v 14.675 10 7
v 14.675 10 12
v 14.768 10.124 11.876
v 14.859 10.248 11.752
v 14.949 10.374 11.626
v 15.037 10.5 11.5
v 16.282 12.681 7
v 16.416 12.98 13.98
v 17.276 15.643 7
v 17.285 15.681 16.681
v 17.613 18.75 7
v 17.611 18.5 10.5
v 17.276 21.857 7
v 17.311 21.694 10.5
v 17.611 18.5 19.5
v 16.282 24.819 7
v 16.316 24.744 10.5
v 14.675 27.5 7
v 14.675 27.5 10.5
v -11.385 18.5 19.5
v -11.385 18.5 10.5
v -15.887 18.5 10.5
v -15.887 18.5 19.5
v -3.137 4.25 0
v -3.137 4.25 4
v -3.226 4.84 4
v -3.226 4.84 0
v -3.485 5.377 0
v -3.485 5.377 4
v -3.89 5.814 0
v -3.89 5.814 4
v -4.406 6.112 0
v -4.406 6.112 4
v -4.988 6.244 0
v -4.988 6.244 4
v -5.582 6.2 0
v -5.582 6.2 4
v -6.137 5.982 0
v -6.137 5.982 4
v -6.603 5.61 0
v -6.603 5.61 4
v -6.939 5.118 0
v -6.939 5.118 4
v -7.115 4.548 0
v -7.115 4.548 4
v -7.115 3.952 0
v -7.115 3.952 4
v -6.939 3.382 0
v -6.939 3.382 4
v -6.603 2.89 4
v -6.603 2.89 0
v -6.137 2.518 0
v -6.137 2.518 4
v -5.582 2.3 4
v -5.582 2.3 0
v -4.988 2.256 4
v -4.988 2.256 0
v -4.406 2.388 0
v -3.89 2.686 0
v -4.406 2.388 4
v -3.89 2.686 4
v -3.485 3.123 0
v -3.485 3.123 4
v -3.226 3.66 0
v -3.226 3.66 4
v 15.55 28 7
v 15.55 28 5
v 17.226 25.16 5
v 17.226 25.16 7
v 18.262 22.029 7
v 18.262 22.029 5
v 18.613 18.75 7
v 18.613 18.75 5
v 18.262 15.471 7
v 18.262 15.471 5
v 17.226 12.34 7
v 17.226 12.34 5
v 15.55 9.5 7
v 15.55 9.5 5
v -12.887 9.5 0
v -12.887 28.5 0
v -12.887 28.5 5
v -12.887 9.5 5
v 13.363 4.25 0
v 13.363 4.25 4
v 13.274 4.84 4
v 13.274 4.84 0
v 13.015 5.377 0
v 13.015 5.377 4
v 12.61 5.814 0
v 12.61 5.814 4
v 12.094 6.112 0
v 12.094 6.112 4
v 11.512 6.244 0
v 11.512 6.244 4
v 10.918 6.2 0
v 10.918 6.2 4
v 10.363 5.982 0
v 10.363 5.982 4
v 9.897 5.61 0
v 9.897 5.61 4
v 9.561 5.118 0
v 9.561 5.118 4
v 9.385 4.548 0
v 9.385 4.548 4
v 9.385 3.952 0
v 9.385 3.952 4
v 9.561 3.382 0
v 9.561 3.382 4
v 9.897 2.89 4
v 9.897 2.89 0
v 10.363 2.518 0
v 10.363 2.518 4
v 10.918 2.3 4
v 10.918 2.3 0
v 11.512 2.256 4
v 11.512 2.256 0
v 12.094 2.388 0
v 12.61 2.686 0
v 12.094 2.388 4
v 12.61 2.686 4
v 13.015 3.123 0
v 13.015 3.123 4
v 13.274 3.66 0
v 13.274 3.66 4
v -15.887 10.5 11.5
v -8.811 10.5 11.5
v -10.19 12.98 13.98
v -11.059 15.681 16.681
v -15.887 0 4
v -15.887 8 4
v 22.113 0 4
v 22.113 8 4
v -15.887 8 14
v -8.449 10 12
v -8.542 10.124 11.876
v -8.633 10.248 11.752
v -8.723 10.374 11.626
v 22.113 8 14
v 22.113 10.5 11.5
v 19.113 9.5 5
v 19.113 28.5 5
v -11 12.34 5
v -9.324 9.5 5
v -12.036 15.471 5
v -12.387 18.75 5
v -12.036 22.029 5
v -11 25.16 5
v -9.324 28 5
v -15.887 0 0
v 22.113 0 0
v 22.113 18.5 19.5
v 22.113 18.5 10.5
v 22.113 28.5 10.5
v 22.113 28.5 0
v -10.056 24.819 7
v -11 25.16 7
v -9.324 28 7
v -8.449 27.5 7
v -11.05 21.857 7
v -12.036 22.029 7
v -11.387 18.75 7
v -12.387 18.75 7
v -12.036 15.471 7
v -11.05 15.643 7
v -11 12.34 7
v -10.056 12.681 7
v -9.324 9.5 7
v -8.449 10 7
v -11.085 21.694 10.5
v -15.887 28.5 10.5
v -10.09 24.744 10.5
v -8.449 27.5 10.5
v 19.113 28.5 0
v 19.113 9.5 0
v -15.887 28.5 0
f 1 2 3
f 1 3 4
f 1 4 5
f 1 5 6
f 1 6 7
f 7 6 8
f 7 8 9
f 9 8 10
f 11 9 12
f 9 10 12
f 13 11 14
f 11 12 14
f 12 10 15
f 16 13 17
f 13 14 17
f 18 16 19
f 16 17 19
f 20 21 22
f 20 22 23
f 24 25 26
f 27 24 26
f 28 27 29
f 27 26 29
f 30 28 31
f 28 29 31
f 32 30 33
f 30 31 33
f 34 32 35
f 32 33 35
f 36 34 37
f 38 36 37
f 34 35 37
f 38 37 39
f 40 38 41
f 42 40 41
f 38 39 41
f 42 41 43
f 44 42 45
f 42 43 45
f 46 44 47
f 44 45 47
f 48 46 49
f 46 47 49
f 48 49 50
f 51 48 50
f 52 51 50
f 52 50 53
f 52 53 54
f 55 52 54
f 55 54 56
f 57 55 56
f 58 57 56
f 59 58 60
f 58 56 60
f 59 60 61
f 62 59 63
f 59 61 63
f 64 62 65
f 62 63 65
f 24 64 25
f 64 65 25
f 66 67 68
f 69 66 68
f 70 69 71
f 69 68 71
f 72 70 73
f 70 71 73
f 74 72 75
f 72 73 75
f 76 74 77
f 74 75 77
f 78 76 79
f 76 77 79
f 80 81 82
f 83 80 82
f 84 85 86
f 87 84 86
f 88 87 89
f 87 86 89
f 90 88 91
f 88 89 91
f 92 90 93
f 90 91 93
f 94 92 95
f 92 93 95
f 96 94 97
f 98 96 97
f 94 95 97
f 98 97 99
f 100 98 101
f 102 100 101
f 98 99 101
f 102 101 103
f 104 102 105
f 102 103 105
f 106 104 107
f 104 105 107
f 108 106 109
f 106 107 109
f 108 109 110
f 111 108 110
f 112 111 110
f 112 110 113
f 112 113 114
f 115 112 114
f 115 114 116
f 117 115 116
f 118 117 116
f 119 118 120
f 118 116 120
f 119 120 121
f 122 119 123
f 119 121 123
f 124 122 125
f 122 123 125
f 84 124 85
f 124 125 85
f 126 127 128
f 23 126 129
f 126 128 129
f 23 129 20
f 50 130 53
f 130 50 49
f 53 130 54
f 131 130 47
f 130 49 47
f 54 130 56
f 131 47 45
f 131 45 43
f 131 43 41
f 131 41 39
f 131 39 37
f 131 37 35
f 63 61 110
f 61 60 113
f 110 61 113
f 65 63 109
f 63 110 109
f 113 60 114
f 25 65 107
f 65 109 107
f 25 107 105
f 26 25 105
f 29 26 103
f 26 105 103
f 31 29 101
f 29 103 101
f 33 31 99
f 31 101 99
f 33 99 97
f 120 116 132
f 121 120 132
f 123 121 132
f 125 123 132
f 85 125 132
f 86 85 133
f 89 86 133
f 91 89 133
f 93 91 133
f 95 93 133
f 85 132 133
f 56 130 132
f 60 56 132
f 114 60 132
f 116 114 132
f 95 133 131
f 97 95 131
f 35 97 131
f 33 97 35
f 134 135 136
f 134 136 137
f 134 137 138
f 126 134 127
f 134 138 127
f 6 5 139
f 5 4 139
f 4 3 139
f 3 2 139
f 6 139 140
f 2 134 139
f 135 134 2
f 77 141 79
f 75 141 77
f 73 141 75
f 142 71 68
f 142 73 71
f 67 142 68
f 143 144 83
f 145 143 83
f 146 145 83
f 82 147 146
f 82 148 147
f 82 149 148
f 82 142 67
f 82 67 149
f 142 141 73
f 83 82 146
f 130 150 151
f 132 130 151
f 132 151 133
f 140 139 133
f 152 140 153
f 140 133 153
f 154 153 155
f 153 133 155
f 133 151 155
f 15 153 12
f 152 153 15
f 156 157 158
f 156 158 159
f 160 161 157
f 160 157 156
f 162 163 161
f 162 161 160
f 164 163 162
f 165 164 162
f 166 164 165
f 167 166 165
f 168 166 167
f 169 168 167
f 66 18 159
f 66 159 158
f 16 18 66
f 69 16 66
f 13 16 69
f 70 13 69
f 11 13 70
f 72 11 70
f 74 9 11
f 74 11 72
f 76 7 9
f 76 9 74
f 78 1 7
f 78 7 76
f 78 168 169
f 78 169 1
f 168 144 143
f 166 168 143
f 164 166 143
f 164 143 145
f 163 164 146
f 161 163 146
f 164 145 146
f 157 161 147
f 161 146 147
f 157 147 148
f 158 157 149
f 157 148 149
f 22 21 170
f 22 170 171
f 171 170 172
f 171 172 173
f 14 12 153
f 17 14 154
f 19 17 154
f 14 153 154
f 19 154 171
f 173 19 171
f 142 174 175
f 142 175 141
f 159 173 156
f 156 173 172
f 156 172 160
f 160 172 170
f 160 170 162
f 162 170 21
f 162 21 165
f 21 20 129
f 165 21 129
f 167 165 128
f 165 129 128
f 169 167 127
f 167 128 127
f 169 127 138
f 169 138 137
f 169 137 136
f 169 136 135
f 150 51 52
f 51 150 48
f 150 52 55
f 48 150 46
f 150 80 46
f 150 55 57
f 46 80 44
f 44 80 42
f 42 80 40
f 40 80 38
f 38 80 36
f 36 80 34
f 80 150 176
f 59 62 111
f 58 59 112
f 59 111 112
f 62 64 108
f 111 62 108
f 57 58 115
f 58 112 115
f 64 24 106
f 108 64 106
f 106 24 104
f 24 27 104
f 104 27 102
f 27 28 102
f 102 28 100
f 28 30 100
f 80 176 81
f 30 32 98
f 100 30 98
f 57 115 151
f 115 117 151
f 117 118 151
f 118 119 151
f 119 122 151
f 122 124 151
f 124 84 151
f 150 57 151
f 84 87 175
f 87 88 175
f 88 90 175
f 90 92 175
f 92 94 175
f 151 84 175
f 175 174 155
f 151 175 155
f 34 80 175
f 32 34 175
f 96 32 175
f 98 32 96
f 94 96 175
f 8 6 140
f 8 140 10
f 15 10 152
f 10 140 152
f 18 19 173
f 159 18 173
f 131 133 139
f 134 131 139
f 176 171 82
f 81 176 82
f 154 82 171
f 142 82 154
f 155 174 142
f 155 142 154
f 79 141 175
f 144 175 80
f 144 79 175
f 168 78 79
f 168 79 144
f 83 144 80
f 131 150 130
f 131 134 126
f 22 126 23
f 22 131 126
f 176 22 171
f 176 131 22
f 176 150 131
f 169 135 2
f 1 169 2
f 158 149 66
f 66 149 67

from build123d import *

# Parameters (mm, degrees)
F0_W      = 38
F0_H      = 28.5
F1_DEPTH  = 19.5
F2_W      = 8
F2_H      = 15.5
F4_DEPTH  = 38
F6_DEPTH  = 19.5
F3_W      = 10
F3_H      = 9
F7_DEPTH  = 38
F9_DEPTH  = 38
F11_DEPTH = 7
F12_W     = 32
F12_H     = 5
F13_DEPTH = 19
F14_R     = 2
F15_DEPTH = 4


with BuildPart() as f1:
    # F0 (on Top) → F1 (new body)
    with BuildSketch(Plane.XY):
        with Locations((3.113019, 14.25)):
            Rectangle(F0_W, F0_H)
    extrude(amount=F1_DEPTH)

    # F2 (on face) → F4 (cut)
    with BuildSketch(Plane.YZ.offset(22.113019)):
        with Locations((4, 11.75)):
            Rectangle(F2_W, F2_H)
    extrude(amount=-F4_DEPTH, mode=Mode.SUBTRACT)

    # F5 (on face) → F6 (cut)
    with BuildSketch(Plane.XY.offset(19.5)):
        with BuildLine():
            ThreePointArc((-8.449312, 27.5), (-11.386981, 18.75), (-8.449312, 10))
            Line((-8.449312, 10), (14.67535, 10))
            ThreePointArc((14.67535, 10), (17.613019, 18.75), (14.67535, 27.5))
            Line((14.67535, 27.5), (-8.449312, 27.5))
        make_face()
    extrude(amount=-F6_DEPTH, mode=Mode.SUBTRACT)

    # F3 (on face) → F7 (cut)
    with BuildSketch(Plane.YZ.offset(22.113019)):
        with Locations((23.5, 15)):
            Rectangle(F3_W, F3_H)
    extrude(amount=-F7_DEPTH, mode=Mode.SUBTRACT)

    # F8 (on face) → F9 (cut)
    with BuildSketch(Plane.YZ.offset(22.113019)):
        Polygon((18.5, 19.5), (8, 19.5), (8, 14), (10.5, 11.5), align=None)
    extrude(amount=-F9_DEPTH, mode=Mode.SUBTRACT)

    # F10 (on face) → F11 (cut)
    with BuildSketch(Plane(origin=(0, 0, 0), x_dir=(1, 0, 0), z_dir=(0, 0, -1))):
        with BuildLine():
            Line((15.550362, -9.5), (-9.324324, -9.5))
            ThreePointArc((-9.324324, -9.5), (-12.386981, -18.75), (-9.324324, -28))
            Line((-9.324324, -28), (15.550362, -28))
            ThreePointArc((15.550362, -28), (18.613019, -18.75), (15.550362, -9.5))
        make_face()
    extrude(amount=-F11_DEPTH, mode=Mode.SUBTRACT)

    # F12 (on face) → F13 (cut)
    with BuildSketch(Plane(origin=(0, 28.5, 0), x_dir=(-1, 0, 0), z_dir=(0, 1, 0))):
        with Locations((-3.113019, 2.5)):
            Rectangle(F12_W, F12_H)
    extrude(amount=-F13_DEPTH, mode=Mode.SUBTRACT)

    # F14 (on face) → F15 (cut)
    with BuildSketch(Plane.XY.offset(4)):
        with Locations((-5.136981, 4.25)):
            Circle(F14_R)
        with Locations((11.363019, 4.25)):
            Circle(F14_R)
    extrude(amount=-F15_DEPTH, mode=Mode.SUBTRACT)


solid = f1.part
